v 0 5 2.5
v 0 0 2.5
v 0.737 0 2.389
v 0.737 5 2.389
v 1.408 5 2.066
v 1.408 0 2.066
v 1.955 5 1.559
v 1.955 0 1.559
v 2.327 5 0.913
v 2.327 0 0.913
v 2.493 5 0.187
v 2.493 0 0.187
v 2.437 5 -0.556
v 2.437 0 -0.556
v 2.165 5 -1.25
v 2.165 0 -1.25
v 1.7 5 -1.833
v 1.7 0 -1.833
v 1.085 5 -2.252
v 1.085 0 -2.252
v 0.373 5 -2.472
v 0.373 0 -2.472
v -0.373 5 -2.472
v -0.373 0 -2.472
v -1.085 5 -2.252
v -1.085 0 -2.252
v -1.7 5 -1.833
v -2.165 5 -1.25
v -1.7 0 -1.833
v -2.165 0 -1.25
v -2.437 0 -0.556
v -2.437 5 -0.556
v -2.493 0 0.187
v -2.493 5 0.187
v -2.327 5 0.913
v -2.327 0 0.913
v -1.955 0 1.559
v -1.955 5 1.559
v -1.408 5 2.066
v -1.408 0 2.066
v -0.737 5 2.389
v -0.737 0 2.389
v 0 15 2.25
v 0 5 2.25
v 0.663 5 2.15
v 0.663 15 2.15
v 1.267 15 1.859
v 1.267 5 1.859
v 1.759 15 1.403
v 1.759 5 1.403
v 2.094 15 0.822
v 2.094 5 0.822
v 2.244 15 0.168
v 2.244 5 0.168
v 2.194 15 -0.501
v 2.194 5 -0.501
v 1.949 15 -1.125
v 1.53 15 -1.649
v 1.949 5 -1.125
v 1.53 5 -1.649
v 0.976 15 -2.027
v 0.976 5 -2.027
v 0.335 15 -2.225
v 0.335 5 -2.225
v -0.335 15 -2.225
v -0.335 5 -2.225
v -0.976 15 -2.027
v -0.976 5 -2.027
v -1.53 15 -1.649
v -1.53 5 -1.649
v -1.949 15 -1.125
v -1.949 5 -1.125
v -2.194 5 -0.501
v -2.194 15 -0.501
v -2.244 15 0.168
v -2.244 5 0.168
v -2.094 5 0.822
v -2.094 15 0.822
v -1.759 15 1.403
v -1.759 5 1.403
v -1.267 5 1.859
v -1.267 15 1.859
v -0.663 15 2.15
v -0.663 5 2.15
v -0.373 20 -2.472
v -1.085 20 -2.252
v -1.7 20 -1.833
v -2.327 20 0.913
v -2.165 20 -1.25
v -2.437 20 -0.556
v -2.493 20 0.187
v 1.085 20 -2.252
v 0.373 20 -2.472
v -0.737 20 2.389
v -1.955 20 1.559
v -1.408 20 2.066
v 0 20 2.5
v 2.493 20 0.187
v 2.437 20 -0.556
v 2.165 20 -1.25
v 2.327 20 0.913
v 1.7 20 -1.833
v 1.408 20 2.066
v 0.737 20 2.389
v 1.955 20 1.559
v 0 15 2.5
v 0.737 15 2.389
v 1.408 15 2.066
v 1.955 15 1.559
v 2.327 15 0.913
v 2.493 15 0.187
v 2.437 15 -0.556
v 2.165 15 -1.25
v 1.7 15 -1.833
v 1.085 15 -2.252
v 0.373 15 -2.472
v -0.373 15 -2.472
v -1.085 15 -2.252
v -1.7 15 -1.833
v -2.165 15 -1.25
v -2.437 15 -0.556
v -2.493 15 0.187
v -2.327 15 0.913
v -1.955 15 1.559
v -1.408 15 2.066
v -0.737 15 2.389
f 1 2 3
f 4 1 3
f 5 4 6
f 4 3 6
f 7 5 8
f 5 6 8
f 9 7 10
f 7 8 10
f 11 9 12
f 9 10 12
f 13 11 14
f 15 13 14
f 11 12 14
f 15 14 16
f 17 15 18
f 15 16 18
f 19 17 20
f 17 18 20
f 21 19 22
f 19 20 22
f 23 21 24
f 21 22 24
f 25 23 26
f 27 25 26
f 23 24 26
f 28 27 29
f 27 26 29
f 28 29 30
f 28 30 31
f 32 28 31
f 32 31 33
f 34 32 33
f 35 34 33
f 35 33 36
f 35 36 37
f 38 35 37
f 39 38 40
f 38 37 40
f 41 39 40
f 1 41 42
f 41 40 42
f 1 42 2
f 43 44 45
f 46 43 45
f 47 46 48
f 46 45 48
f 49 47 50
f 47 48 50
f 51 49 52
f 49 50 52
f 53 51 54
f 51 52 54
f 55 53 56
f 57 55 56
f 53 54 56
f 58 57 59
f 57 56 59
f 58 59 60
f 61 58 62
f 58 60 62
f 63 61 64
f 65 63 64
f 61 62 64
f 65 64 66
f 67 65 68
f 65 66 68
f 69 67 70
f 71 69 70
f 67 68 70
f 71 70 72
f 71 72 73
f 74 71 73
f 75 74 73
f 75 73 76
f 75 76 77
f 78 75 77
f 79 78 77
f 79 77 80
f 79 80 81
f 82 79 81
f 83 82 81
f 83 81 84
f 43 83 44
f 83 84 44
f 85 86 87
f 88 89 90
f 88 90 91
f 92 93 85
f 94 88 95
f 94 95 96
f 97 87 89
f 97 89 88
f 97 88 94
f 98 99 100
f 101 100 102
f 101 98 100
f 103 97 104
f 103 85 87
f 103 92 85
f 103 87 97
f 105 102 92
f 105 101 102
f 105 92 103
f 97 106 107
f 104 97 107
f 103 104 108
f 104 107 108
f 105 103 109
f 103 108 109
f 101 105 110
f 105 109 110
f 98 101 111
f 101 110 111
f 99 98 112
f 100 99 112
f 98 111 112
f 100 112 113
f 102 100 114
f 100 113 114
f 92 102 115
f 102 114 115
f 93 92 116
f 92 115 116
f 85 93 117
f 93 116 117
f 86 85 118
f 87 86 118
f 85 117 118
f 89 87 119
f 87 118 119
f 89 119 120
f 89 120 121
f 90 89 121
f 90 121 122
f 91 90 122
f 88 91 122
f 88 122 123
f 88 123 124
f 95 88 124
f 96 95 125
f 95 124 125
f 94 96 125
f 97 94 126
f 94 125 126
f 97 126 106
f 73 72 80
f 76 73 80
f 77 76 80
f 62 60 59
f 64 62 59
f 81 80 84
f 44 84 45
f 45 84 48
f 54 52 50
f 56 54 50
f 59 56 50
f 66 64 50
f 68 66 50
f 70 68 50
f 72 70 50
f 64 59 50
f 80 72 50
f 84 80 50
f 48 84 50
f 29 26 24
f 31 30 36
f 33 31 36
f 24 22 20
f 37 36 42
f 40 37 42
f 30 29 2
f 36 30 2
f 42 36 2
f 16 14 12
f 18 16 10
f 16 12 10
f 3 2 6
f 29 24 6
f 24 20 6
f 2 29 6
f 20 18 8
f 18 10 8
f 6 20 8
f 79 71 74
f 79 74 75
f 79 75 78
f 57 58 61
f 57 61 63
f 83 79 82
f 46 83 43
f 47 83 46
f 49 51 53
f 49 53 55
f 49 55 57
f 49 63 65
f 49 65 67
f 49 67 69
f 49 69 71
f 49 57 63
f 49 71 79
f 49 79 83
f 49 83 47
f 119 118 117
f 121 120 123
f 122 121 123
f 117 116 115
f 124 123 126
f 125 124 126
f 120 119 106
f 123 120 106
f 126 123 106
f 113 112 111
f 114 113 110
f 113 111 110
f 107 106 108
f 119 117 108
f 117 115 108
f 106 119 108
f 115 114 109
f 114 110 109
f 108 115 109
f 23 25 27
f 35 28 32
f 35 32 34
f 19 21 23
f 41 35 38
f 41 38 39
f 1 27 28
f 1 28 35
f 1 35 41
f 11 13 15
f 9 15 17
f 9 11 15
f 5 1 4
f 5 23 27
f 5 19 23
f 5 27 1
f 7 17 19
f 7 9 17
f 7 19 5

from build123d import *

# Parameters (mm, degrees)
SKETCH1_R           = 2.5
BOSS_EXTRUDE1_DEPTH = 5
SKETCH2_R           = 2.25
BOSS_EXTRUDE2_DEPTH = 10
SKETCH3_R           = 2.5
BOSS_EXTRUDE3_DEPTH = 5


with BuildPart() as part:
    # Sketch1 → Boss-Extrude1 (new body)
    with BuildSketch(Plane(origin=(0, 0, 0), x_dir=(1, 0, 0), z_dir=(0, 1, 0))):
        with Locations(Location((0, 0, 0), (0, 0, 270))):
            Circle(SKETCH1_R)
    extrude(amount=BOSS_EXTRUDE1_DEPTH)


with BuildPart() as body_2:
    # Sketch2 → Boss-Extrude2 (new body)
    with BuildSketch(Plane(origin=(0, 5, 0), x_dir=(1, 0, 0), z_dir=(0, 1, 0))):
        with Locations(Location((0, 0, 0), (0, 0, 270))):
            Circle(SKETCH2_R)
    extrude(amount=BOSS_EXTRUDE2_DEPTH)


with BuildPart() as body_3:
    # Sketch3 → Boss-Extrude3 (new body)
    with BuildSketch(Plane(origin=(0, 15, 0), x_dir=(1, 0, 0), z_dir=(0, 1, 0))):
        with Locations(Location((0, 0, 0), (0, 0, 270))):
            Circle(SKETCH3_R)
    extrude(amount=BOSS_EXTRUDE3_DEPTH)


solid = Compound([part.part, body_2.part, body_3.part])
